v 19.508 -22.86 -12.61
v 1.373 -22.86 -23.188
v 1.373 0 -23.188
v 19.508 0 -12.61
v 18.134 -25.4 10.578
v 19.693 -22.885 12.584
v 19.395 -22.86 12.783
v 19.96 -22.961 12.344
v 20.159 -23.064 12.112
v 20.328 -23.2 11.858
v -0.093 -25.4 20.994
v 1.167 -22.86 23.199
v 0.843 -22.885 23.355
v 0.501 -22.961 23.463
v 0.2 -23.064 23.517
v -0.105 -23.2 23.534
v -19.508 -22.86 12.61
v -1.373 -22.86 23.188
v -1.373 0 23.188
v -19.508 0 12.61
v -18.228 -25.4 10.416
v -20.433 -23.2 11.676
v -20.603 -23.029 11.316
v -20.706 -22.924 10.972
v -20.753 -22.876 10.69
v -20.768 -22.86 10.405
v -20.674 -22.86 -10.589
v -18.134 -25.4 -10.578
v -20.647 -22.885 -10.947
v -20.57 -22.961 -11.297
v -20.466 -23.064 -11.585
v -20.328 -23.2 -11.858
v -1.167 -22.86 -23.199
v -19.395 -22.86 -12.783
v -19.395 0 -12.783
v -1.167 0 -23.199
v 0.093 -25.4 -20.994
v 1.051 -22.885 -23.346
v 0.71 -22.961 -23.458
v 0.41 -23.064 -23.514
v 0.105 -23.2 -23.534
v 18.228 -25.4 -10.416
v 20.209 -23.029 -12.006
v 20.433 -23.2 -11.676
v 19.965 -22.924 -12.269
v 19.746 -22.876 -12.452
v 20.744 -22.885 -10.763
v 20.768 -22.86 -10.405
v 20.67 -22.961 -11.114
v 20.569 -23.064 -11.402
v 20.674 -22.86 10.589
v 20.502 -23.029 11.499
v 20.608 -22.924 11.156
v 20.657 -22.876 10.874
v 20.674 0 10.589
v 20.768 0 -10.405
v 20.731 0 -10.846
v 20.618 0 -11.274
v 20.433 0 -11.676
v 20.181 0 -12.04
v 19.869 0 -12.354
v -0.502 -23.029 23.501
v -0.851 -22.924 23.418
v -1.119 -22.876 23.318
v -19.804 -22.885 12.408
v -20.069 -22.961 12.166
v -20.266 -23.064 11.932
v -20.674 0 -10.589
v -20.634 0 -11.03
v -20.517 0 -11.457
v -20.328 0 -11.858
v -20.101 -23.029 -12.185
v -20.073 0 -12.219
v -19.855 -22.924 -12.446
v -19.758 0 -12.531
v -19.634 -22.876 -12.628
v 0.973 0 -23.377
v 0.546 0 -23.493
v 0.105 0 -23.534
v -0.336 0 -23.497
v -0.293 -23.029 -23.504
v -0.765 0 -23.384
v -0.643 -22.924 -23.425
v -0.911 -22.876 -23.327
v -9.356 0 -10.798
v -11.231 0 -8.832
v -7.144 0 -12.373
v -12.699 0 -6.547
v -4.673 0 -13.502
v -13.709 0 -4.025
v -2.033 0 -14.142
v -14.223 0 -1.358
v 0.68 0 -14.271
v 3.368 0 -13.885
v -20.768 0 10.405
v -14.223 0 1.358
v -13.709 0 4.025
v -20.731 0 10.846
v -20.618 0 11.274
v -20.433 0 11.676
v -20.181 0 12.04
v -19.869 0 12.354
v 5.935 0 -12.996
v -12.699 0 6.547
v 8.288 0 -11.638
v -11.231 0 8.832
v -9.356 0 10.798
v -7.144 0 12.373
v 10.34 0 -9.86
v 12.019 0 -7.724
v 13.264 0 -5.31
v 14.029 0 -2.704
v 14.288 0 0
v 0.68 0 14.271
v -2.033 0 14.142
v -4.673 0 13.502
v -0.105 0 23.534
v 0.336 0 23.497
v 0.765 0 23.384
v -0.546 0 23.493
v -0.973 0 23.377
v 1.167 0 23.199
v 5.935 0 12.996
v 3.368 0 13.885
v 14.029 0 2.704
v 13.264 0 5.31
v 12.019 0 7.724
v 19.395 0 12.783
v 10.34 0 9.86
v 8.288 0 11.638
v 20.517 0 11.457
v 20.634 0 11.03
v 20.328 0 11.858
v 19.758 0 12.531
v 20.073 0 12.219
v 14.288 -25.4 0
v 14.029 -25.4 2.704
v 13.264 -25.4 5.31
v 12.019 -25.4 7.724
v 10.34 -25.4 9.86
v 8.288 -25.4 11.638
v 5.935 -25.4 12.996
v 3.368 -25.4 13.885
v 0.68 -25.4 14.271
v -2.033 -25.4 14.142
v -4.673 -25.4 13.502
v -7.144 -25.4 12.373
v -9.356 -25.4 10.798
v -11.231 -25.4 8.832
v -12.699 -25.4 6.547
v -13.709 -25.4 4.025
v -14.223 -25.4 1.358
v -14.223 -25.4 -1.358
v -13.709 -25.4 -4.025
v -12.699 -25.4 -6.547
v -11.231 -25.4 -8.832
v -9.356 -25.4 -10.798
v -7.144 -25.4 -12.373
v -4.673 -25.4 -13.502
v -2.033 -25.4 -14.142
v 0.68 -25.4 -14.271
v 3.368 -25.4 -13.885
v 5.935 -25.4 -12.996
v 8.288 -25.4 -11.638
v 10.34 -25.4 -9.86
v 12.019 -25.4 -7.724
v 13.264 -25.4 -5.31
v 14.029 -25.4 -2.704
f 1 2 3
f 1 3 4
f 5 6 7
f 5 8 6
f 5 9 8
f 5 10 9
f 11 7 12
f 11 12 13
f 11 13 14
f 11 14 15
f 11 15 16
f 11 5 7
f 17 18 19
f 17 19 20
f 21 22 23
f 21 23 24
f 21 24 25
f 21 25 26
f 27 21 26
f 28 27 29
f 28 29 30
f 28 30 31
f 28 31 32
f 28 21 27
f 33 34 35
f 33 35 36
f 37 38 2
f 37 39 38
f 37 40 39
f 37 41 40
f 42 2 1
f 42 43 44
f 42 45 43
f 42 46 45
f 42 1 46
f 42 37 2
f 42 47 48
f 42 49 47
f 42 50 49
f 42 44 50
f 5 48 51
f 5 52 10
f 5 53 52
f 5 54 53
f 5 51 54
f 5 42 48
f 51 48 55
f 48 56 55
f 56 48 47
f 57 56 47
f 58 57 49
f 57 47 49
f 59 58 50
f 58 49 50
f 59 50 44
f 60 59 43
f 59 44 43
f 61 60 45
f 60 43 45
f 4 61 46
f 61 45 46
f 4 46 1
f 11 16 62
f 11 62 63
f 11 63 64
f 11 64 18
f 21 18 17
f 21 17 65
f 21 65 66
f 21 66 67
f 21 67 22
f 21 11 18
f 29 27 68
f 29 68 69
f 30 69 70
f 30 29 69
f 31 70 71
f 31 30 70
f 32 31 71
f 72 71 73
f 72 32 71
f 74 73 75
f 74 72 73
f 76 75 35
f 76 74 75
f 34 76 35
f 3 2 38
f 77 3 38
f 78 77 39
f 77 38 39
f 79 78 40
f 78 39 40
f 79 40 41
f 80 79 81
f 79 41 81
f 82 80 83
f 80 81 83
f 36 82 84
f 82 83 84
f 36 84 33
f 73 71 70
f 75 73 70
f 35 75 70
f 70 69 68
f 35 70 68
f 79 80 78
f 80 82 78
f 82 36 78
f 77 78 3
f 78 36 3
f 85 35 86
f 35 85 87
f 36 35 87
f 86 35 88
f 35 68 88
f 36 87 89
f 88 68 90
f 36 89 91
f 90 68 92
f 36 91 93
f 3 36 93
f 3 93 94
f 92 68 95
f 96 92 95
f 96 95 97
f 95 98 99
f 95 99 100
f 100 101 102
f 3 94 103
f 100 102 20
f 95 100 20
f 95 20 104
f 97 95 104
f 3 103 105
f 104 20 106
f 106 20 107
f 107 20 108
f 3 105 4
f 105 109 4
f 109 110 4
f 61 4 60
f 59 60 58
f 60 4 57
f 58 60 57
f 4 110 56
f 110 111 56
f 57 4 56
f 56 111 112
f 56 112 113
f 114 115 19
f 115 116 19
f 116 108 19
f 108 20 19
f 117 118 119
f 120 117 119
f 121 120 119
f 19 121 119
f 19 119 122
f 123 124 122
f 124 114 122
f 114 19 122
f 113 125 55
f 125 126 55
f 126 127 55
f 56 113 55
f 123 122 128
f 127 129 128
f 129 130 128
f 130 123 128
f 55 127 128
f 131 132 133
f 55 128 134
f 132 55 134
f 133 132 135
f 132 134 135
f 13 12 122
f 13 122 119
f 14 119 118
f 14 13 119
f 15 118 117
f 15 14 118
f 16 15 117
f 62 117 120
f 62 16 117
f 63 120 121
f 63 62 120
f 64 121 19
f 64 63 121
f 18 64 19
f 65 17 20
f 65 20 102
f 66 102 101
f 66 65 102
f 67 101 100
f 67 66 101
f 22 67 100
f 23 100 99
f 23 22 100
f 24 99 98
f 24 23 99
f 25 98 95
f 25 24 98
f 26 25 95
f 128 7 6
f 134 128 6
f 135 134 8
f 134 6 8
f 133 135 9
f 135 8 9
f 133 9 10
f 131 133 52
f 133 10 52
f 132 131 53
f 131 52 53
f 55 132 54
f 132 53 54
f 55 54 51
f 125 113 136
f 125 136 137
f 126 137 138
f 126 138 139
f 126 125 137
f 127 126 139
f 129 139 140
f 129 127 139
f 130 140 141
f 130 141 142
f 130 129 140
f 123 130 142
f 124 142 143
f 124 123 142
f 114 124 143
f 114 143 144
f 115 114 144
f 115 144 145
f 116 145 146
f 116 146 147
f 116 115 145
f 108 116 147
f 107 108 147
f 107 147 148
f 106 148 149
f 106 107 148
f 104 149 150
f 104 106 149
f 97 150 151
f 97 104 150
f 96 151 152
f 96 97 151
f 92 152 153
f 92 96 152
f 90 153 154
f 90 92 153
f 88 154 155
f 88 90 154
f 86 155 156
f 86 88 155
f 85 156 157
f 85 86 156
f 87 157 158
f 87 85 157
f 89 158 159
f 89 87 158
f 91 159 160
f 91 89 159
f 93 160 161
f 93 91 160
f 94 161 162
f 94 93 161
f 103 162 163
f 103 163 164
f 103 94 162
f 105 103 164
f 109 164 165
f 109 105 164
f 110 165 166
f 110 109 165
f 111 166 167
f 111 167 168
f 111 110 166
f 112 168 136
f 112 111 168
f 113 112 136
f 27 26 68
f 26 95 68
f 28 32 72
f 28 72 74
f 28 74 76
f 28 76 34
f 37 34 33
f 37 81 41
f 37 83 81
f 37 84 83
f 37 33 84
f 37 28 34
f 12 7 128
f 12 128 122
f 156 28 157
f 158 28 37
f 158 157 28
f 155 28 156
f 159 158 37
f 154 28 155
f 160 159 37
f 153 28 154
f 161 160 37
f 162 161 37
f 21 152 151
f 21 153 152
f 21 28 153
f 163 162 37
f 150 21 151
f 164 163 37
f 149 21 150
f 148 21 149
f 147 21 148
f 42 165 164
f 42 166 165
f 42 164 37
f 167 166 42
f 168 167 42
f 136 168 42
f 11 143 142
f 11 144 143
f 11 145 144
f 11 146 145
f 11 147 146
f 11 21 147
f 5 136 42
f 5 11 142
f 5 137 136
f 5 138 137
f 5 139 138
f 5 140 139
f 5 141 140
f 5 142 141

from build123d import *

# Parameters (mm, degrees)
F0_R     = 14.2875
F1_DEPTH = 25.4
F2_SIZE  = 2.54
F3_R     = 2.54


with BuildPart() as f1:
    # F0 (on Front) → F1 (new body)
    with BuildSketch(Plane.XZ):
        Polygon((20.667777, 12.055561), (-0.106534, 23.9266), (-20.774311, 11.871039), (-20.667777, -12.055561), (0.106534, -23.9266), (20.774311, -11.871039), align=None)
        Circle(F0_R, mode=Mode.SUBTRACT)
    extrude(amount=F1_DEPTH)

    # F2
    f2_edges = [f1.edges().sort_by_distance(p)[0] for p in [
        (-10.440422, -25.4, 17.89882),
        (-20.721044, -25.4, -0.092261),
        (-10.280621, -25.4, -17.991081),
        (10.440422, -25.4, -17.89882),
        (20.721044, -25.4, 0.092261),
        (10.280621, -25.4, 17.991081),
    ]]
    chamfer(f2_edges, length=F2_SIZE)

    # F3
    f3_edges = [f1.edges().sort_by_distance(p)[0] for p in [
        (-20.774311, -11.43, 11.871039),
        (-0.106534, -11.43, 23.9266),
        (-20.667777, -11.43, -12.055561),
        (0.106534, -11.43, -23.9266),
        (20.774311, -11.43, -11.871039),
        (20.667777, -11.43, 12.055561),
    ]]
    fillet(f3_edges, radius=F3_R)


solid = f1.part
